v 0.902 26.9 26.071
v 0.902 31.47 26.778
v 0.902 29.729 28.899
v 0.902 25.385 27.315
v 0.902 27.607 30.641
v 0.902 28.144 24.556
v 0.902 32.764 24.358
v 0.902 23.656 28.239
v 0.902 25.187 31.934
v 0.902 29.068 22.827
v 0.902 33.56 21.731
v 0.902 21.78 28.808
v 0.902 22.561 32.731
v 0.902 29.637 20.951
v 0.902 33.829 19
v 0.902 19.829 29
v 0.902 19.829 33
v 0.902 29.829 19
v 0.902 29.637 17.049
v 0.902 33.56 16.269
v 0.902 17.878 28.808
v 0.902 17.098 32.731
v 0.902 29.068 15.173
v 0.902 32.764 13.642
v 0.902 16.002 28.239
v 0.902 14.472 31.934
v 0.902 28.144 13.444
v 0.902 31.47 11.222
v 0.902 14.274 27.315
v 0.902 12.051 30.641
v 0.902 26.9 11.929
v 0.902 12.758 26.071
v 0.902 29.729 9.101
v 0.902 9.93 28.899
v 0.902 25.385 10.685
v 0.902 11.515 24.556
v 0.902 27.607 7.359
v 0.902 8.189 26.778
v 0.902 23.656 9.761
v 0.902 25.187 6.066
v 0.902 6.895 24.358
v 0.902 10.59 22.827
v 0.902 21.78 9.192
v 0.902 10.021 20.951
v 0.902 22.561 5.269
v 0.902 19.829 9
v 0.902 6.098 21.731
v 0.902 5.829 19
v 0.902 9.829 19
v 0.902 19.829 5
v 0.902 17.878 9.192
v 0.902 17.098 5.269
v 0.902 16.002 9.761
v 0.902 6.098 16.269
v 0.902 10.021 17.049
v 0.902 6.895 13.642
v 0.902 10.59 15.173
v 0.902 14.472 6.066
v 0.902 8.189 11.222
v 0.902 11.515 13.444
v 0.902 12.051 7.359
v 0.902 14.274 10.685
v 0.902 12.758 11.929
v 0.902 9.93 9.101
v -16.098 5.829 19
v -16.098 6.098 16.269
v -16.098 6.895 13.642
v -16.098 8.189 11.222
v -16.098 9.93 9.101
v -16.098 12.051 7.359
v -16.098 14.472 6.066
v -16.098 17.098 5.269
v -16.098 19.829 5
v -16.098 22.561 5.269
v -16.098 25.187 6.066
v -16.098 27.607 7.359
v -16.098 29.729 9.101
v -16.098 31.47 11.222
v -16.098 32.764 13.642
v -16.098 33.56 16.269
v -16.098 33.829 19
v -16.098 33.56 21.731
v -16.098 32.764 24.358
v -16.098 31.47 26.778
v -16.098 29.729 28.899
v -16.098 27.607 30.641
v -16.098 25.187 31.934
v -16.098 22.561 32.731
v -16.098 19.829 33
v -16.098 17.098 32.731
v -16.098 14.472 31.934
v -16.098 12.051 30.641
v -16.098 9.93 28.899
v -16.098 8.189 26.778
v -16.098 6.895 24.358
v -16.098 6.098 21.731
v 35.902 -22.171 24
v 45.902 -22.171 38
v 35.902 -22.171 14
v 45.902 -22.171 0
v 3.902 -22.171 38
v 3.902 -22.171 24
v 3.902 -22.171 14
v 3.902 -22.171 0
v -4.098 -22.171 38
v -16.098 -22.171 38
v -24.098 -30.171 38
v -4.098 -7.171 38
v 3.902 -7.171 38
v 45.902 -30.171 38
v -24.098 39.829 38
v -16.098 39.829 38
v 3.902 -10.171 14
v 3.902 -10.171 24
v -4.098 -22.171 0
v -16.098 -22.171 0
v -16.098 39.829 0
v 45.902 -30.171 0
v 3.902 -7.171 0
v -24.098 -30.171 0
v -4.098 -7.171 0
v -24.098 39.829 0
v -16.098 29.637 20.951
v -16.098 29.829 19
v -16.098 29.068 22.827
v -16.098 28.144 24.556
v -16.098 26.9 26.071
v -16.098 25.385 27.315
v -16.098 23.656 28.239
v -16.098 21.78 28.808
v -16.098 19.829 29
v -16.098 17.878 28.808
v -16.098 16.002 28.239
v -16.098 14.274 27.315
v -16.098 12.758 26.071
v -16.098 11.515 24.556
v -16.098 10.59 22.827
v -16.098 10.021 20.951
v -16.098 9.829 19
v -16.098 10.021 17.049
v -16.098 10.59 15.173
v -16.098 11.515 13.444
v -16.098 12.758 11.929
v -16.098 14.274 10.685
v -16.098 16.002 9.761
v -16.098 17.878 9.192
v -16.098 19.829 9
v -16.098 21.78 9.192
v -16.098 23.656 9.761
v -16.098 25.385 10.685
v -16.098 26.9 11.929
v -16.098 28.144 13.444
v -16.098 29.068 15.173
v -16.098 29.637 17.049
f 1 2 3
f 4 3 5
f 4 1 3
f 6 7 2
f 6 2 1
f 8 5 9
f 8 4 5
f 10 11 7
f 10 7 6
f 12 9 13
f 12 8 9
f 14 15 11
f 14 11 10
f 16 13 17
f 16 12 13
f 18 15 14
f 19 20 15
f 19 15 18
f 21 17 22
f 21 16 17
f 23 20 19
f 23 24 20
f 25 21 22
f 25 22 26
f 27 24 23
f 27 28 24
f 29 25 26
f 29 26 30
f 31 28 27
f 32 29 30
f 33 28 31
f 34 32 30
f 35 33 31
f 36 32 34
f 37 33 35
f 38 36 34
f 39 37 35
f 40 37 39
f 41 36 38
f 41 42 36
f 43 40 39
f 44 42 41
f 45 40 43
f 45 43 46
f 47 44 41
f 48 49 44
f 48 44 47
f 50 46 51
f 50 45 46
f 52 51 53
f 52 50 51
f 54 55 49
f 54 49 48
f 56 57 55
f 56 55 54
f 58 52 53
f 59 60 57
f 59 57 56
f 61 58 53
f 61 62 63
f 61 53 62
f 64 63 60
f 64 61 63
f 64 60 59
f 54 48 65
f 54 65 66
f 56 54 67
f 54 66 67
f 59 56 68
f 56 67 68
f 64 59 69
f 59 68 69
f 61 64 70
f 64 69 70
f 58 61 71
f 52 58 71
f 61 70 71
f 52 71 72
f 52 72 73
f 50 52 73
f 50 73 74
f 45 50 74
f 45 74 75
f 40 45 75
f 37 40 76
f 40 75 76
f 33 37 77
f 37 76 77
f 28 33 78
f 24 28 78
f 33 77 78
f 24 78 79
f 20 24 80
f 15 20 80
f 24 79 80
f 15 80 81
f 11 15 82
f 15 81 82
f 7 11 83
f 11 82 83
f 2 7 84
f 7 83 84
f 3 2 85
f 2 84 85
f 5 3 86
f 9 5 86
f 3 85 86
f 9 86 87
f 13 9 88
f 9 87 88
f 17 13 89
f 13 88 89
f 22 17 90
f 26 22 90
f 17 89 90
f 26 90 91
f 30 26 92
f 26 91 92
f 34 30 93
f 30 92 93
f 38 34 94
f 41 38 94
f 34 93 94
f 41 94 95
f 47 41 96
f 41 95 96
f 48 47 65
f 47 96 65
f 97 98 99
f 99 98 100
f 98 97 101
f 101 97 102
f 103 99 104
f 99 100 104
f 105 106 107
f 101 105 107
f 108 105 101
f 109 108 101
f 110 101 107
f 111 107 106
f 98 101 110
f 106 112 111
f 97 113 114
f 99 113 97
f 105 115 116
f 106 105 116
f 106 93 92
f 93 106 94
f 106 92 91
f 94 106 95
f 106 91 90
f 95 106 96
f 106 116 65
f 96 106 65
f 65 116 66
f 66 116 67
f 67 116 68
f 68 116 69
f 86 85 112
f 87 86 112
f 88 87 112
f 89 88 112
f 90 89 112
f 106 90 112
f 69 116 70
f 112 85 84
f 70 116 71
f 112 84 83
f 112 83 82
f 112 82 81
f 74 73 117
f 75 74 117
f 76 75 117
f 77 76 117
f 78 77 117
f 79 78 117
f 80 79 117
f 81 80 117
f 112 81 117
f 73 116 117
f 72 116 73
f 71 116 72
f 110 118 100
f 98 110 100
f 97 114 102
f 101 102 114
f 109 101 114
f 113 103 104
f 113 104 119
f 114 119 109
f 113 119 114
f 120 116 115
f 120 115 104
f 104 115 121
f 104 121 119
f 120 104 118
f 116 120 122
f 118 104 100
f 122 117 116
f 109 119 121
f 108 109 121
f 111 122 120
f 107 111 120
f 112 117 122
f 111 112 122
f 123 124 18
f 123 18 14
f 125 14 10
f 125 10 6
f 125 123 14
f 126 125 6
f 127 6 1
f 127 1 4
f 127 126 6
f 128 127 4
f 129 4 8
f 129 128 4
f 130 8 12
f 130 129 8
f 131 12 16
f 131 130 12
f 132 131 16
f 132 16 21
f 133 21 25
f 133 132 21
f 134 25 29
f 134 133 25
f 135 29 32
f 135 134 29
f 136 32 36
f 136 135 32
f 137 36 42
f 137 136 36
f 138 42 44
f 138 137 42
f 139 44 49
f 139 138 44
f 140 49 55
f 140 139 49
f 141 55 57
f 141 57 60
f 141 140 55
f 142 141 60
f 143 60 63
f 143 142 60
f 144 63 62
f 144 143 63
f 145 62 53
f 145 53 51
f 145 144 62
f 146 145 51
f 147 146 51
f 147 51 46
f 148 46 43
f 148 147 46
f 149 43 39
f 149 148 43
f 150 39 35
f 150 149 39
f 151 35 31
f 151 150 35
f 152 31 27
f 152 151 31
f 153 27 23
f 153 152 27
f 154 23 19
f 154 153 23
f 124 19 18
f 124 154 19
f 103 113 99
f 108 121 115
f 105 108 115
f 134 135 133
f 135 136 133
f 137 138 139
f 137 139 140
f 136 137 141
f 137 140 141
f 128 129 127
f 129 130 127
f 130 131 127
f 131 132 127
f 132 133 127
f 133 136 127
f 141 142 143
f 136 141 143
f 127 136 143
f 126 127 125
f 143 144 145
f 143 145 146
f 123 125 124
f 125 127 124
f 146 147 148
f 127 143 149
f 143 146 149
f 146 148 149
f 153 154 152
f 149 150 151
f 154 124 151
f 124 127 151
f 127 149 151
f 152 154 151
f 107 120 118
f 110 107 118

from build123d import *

# Parameters (mm, degrees)
BOSS_EXTRUDE1_DEPTH = 38
RIB1_REACH          = 65.674
SKETCH2_WALL_W      = 163.52442716
SKETCH2_WALL_H      = 10
SKETCH3_R           = 14
SKETCH3_R_2         = 10
BOSS_EXTRUDE2_DEPTH = 17


with BuildPart() as part:
    # Sketch1 → Boss-Extrude1 (new body)
    with BuildSketch(Plane.XY):
        Polygon((-16.097560976, 39.829268293), (-24.097560976, 39.829268293), (-24.097560976, -30.170731707), (45.902439024, -30.170731707), (45.902439024, -22.170731707), (3.902439024, -22.170731707), (3.902439024, -7.170731707), (-4.097560976, -7.170731707), (-4.097560976, -22.170731707), (-16.097560976, -22.170731707), align=None)
    extrude(amount=BOSS_EXTRUDE1_DEPTH)

    # Sketch2 wall → Rib1 (add, up to next)
    with BuildSketch(Plane(origin=(19.902439024, -16.170731707, 19), x_dir=(0.936329177569, -0.351123441588, 0), z_dir=(0.351123441588, 0.936329177569, 0)), mode=Mode.PRIVATE) as rib1_sk1:
        Rectangle(SKETCH2_WALL_W, SKETCH2_WALL_H)
    rib1_tool1 = extrude(rib1_sk1.sketch, amount=-RIB1_REACH, mode=Mode.PRIVATE) - part.part
    add(rib1_tool1.solids().sort_by_distance((19.902439024, -16.170731707, 19))[0])

    # Sketch3 → Boss-Extrude2 (add)
    with BuildSketch(Plane(origin=(-16.097560976, 0, 0), x_dir=(0, 0, -1), z_dir=(1, 0, 0))):
        with Locations(Location((-19, 19.829268293, 0), (0, 0, 270))):
            Circle(SKETCH3_R)
        with Locations(Location((-19, 19.829268293, 0), (0, 0, 90))):
            Circle(SKETCH3_R_2, mode=Mode.SUBTRACT)
    extrude(amount=BOSS_EXTRUDE2_DEPTH)


solid = part.part
